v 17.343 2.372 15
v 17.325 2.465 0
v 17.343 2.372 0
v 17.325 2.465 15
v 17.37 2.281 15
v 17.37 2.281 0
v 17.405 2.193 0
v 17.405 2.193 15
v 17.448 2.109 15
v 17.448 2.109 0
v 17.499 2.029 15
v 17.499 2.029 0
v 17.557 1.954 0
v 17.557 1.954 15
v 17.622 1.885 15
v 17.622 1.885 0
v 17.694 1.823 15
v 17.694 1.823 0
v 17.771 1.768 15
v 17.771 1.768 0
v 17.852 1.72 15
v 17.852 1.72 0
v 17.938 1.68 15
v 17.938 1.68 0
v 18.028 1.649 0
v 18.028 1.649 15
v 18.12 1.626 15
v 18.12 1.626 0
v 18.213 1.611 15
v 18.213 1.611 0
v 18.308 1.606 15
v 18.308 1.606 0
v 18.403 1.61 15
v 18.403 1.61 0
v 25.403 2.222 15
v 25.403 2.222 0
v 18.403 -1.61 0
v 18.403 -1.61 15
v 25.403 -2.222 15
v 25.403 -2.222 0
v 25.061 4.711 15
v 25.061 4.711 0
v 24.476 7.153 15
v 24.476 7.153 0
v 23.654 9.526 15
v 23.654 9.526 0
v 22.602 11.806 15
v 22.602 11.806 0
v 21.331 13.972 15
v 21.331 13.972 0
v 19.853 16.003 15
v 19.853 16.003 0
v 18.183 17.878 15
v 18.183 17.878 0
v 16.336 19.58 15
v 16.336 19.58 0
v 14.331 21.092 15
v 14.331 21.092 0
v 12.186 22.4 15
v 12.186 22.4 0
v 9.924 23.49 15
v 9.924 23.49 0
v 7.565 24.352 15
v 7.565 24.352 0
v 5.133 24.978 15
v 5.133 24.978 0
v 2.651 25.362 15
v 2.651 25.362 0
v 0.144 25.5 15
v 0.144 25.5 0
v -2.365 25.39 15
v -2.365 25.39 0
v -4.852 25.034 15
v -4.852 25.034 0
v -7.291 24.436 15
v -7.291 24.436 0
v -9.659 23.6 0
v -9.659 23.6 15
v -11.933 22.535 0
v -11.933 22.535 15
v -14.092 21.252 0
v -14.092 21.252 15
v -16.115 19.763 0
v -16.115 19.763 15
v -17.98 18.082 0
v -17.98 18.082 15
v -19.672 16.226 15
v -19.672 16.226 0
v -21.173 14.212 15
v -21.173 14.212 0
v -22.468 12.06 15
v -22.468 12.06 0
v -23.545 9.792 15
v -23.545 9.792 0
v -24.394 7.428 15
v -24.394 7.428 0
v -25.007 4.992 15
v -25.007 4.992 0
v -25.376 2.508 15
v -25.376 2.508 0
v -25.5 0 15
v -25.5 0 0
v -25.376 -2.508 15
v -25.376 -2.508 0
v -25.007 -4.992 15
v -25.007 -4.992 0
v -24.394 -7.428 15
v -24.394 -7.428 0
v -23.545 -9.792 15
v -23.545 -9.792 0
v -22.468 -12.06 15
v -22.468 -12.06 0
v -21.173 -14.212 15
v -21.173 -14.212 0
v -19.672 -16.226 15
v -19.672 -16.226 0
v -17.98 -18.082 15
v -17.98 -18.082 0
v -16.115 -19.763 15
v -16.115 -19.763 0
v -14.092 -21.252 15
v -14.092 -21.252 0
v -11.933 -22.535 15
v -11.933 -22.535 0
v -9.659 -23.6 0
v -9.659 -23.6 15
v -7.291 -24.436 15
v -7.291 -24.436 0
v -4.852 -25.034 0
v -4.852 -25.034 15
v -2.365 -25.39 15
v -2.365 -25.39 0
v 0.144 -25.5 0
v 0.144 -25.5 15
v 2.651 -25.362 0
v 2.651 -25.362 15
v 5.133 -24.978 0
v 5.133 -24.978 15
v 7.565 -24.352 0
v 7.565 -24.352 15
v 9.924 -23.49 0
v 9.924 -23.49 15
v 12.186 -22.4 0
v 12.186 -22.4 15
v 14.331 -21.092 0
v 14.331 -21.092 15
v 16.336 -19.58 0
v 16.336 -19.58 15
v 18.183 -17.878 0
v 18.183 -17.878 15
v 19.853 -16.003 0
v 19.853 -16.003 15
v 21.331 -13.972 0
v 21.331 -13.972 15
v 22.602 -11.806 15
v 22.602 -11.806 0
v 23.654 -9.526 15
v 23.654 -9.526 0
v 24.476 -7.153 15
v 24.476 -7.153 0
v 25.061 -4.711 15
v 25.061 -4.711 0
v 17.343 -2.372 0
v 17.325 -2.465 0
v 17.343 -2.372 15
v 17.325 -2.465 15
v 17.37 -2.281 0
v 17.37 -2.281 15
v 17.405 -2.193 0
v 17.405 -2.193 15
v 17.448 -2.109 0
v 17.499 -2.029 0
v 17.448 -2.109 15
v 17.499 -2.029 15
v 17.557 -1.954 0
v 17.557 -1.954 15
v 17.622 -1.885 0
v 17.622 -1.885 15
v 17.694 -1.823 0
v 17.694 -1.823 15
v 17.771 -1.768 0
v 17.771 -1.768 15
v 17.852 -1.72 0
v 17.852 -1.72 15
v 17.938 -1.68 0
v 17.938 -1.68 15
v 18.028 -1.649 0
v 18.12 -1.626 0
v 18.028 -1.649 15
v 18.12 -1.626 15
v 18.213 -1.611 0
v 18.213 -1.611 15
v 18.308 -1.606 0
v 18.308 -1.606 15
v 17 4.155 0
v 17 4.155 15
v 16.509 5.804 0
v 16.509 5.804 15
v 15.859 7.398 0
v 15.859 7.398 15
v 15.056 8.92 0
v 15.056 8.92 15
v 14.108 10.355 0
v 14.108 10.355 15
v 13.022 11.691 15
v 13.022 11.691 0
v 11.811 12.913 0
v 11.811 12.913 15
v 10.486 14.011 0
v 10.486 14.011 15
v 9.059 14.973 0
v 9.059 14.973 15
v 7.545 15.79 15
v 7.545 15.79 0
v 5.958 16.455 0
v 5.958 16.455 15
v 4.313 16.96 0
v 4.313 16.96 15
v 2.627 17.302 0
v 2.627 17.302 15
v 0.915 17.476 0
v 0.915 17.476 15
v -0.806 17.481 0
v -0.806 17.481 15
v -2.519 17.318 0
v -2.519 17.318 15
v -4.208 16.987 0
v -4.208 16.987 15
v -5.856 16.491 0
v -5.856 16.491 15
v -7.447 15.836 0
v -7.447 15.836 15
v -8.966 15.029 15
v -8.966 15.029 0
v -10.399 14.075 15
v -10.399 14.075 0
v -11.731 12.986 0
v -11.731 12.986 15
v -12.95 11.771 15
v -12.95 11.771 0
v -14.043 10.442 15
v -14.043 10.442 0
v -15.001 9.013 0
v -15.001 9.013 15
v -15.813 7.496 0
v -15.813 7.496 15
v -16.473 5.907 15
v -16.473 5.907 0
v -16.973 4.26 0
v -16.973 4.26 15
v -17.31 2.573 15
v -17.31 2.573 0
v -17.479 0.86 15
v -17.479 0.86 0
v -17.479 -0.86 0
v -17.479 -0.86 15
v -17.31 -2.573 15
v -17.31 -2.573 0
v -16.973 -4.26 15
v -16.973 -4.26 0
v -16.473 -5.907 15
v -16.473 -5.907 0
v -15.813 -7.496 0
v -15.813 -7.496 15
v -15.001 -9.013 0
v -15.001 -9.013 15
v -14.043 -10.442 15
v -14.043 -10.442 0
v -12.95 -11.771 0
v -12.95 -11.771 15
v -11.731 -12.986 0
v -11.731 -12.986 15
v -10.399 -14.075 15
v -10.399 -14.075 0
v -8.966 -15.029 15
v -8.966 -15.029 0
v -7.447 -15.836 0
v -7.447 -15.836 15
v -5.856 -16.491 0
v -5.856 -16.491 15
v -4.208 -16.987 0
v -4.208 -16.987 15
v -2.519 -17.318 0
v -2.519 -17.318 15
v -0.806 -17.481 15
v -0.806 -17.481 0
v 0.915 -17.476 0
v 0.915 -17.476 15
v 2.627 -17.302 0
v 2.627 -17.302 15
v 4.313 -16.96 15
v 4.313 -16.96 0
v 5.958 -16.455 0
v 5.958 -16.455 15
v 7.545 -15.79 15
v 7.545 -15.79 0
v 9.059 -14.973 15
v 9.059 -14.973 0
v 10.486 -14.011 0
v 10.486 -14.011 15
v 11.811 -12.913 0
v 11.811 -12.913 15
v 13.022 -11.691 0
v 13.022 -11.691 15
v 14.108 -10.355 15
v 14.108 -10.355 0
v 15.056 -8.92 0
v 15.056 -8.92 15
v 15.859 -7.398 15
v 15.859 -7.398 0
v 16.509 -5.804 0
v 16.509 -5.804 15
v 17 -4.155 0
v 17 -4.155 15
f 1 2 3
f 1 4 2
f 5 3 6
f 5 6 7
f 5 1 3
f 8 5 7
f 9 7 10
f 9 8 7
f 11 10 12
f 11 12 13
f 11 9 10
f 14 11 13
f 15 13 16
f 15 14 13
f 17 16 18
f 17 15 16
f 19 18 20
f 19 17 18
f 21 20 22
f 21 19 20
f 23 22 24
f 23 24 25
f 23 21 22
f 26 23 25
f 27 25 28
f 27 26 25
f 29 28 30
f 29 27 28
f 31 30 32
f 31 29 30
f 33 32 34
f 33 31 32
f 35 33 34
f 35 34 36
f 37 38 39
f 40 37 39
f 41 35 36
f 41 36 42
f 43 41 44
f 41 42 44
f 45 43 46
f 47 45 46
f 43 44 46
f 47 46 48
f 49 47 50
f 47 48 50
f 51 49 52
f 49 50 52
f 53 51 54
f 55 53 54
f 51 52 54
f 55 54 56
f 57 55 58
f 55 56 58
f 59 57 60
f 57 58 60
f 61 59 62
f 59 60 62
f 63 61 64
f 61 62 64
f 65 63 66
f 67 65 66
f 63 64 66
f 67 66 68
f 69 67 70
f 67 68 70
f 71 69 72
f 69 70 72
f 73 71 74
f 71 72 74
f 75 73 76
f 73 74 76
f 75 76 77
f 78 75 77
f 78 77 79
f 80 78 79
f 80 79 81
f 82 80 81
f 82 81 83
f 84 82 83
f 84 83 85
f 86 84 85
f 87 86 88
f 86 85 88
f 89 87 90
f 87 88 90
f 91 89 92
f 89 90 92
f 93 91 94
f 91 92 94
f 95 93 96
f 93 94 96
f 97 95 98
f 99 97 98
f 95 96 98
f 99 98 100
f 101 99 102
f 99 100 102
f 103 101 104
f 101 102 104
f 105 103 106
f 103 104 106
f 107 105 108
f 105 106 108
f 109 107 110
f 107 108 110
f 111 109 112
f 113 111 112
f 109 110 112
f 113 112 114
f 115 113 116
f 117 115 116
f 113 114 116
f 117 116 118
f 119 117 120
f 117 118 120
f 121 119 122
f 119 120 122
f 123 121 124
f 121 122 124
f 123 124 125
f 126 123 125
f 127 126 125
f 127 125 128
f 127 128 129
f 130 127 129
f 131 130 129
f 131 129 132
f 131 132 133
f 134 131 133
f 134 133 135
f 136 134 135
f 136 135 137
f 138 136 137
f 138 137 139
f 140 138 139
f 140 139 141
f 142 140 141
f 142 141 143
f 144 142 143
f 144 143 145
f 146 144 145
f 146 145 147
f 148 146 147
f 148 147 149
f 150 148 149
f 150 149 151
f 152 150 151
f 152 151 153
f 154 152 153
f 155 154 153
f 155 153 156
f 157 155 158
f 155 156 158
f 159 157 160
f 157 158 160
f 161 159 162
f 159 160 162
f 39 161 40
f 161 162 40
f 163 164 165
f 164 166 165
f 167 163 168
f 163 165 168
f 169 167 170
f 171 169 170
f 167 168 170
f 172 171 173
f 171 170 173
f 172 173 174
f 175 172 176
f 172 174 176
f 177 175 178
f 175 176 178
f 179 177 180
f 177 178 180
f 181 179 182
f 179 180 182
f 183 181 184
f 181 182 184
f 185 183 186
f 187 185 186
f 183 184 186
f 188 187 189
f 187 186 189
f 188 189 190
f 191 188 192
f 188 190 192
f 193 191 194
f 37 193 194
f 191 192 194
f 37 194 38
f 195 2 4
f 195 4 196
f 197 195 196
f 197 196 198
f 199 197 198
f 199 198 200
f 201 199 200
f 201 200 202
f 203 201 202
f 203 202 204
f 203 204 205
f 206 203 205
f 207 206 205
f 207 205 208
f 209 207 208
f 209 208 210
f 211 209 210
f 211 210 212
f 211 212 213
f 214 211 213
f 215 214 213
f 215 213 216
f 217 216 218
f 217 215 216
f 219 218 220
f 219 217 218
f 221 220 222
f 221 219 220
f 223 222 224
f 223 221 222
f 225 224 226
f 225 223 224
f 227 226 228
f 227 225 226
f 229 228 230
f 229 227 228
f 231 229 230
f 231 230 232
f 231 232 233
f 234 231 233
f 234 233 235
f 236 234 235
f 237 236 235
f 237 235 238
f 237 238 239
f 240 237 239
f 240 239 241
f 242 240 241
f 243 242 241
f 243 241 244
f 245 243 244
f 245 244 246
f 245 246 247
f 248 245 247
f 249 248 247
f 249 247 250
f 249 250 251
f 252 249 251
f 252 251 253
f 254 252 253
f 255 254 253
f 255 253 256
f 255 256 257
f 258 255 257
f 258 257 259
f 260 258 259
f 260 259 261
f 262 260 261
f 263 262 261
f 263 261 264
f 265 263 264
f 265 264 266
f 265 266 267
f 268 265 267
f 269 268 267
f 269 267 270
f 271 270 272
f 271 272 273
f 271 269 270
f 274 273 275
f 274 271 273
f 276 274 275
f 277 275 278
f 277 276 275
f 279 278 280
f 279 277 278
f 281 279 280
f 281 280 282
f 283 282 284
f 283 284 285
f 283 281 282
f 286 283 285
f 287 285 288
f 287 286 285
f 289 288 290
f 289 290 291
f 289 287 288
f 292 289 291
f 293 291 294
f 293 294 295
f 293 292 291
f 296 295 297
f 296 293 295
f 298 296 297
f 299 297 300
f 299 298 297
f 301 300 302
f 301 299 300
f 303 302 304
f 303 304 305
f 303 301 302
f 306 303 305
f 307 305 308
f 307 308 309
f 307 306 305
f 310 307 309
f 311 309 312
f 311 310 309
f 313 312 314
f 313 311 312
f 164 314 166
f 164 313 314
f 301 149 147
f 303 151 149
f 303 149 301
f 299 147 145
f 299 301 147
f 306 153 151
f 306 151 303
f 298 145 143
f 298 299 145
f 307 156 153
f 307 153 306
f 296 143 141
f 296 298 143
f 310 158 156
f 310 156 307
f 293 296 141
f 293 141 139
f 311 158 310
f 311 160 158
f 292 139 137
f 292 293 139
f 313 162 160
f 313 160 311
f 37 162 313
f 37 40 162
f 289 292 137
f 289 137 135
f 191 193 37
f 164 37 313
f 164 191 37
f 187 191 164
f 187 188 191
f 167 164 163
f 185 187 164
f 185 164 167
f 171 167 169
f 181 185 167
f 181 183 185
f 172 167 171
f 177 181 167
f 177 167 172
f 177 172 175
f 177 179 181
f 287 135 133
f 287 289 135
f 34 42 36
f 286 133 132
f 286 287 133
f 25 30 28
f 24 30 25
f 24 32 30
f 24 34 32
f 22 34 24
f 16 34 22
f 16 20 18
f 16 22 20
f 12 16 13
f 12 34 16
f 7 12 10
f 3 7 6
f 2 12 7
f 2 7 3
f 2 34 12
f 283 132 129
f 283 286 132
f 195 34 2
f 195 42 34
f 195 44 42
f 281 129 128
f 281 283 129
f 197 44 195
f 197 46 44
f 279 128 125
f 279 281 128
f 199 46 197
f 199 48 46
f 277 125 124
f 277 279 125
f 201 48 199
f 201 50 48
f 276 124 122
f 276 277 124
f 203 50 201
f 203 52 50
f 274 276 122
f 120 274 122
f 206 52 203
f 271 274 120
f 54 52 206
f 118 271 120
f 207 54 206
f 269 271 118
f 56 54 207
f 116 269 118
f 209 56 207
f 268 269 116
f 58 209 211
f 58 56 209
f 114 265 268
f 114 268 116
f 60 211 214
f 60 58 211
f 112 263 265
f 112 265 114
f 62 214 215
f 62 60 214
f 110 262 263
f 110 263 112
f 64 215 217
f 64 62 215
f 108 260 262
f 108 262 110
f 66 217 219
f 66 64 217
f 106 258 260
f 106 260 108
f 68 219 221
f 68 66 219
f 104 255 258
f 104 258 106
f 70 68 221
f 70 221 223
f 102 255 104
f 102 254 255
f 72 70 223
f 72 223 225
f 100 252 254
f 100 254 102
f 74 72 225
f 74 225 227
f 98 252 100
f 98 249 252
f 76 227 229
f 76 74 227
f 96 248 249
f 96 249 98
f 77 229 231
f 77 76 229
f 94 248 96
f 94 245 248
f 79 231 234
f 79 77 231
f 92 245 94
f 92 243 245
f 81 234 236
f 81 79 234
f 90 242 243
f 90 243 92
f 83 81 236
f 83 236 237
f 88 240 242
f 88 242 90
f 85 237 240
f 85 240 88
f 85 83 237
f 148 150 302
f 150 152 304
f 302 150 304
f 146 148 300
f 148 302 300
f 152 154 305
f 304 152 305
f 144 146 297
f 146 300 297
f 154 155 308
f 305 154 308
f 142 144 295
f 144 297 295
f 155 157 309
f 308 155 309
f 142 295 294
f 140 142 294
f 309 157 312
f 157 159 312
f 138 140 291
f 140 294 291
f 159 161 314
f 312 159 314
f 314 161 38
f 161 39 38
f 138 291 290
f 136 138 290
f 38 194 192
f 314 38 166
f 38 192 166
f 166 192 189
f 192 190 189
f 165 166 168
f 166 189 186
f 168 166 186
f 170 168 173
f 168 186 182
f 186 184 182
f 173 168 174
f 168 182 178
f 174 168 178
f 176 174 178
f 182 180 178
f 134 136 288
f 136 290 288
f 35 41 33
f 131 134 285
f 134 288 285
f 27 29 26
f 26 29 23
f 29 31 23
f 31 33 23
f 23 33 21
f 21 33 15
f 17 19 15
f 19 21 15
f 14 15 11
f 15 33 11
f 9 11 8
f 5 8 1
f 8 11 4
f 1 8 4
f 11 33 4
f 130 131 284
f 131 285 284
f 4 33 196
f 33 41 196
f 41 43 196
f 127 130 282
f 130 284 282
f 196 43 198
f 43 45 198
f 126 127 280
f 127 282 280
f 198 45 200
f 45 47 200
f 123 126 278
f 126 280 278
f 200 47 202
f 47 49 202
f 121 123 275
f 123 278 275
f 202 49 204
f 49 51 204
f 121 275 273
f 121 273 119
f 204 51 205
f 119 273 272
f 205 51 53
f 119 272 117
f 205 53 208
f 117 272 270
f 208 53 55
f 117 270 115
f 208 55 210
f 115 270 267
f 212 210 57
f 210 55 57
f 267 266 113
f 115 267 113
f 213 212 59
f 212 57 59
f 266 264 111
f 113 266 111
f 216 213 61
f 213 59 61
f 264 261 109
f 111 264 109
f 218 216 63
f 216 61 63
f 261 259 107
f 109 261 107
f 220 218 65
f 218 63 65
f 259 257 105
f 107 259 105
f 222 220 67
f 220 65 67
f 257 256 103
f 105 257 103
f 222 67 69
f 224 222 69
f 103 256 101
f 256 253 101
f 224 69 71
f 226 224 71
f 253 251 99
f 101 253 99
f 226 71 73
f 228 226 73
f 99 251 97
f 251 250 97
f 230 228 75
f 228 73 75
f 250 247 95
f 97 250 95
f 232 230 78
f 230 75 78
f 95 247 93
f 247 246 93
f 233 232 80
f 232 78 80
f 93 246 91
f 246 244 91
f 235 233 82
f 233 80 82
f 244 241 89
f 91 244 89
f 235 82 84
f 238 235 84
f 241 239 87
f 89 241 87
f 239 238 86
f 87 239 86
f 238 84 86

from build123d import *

# Parameters (mm, degrees)
PAD_DEPTH = 15
FILLET_R  = 1


with BuildPart() as part:
    # Sketch → Pad (new body)
    with BuildSketch(Plane.XY):
        with BuildLine():
            ThreePointArc((17.433407, 1.525225), (-17.5, 0), (17.433407, -1.525225))
            Line((17.433407, -1.525225), (25.402965, -2.222471))
            ThreePointArc((25.402965, 2.222471), (-25.5, 0), (25.402965, -2.222471))
            Line((17.433407, 1.525225), (25.402965, 2.222471))
        make_face()
    extrude(amount=PAD_DEPTH)

    # Fillet
    fillet_edges = [part.edges().sort_by_distance(p)[0] for p in [
        (17.433407, 1.525225, 7.5),
        (17.433407, -1.525225, 7.5),
    ]]
    fillet(fillet_edges, radius=FILLET_R)


solid = part.part
